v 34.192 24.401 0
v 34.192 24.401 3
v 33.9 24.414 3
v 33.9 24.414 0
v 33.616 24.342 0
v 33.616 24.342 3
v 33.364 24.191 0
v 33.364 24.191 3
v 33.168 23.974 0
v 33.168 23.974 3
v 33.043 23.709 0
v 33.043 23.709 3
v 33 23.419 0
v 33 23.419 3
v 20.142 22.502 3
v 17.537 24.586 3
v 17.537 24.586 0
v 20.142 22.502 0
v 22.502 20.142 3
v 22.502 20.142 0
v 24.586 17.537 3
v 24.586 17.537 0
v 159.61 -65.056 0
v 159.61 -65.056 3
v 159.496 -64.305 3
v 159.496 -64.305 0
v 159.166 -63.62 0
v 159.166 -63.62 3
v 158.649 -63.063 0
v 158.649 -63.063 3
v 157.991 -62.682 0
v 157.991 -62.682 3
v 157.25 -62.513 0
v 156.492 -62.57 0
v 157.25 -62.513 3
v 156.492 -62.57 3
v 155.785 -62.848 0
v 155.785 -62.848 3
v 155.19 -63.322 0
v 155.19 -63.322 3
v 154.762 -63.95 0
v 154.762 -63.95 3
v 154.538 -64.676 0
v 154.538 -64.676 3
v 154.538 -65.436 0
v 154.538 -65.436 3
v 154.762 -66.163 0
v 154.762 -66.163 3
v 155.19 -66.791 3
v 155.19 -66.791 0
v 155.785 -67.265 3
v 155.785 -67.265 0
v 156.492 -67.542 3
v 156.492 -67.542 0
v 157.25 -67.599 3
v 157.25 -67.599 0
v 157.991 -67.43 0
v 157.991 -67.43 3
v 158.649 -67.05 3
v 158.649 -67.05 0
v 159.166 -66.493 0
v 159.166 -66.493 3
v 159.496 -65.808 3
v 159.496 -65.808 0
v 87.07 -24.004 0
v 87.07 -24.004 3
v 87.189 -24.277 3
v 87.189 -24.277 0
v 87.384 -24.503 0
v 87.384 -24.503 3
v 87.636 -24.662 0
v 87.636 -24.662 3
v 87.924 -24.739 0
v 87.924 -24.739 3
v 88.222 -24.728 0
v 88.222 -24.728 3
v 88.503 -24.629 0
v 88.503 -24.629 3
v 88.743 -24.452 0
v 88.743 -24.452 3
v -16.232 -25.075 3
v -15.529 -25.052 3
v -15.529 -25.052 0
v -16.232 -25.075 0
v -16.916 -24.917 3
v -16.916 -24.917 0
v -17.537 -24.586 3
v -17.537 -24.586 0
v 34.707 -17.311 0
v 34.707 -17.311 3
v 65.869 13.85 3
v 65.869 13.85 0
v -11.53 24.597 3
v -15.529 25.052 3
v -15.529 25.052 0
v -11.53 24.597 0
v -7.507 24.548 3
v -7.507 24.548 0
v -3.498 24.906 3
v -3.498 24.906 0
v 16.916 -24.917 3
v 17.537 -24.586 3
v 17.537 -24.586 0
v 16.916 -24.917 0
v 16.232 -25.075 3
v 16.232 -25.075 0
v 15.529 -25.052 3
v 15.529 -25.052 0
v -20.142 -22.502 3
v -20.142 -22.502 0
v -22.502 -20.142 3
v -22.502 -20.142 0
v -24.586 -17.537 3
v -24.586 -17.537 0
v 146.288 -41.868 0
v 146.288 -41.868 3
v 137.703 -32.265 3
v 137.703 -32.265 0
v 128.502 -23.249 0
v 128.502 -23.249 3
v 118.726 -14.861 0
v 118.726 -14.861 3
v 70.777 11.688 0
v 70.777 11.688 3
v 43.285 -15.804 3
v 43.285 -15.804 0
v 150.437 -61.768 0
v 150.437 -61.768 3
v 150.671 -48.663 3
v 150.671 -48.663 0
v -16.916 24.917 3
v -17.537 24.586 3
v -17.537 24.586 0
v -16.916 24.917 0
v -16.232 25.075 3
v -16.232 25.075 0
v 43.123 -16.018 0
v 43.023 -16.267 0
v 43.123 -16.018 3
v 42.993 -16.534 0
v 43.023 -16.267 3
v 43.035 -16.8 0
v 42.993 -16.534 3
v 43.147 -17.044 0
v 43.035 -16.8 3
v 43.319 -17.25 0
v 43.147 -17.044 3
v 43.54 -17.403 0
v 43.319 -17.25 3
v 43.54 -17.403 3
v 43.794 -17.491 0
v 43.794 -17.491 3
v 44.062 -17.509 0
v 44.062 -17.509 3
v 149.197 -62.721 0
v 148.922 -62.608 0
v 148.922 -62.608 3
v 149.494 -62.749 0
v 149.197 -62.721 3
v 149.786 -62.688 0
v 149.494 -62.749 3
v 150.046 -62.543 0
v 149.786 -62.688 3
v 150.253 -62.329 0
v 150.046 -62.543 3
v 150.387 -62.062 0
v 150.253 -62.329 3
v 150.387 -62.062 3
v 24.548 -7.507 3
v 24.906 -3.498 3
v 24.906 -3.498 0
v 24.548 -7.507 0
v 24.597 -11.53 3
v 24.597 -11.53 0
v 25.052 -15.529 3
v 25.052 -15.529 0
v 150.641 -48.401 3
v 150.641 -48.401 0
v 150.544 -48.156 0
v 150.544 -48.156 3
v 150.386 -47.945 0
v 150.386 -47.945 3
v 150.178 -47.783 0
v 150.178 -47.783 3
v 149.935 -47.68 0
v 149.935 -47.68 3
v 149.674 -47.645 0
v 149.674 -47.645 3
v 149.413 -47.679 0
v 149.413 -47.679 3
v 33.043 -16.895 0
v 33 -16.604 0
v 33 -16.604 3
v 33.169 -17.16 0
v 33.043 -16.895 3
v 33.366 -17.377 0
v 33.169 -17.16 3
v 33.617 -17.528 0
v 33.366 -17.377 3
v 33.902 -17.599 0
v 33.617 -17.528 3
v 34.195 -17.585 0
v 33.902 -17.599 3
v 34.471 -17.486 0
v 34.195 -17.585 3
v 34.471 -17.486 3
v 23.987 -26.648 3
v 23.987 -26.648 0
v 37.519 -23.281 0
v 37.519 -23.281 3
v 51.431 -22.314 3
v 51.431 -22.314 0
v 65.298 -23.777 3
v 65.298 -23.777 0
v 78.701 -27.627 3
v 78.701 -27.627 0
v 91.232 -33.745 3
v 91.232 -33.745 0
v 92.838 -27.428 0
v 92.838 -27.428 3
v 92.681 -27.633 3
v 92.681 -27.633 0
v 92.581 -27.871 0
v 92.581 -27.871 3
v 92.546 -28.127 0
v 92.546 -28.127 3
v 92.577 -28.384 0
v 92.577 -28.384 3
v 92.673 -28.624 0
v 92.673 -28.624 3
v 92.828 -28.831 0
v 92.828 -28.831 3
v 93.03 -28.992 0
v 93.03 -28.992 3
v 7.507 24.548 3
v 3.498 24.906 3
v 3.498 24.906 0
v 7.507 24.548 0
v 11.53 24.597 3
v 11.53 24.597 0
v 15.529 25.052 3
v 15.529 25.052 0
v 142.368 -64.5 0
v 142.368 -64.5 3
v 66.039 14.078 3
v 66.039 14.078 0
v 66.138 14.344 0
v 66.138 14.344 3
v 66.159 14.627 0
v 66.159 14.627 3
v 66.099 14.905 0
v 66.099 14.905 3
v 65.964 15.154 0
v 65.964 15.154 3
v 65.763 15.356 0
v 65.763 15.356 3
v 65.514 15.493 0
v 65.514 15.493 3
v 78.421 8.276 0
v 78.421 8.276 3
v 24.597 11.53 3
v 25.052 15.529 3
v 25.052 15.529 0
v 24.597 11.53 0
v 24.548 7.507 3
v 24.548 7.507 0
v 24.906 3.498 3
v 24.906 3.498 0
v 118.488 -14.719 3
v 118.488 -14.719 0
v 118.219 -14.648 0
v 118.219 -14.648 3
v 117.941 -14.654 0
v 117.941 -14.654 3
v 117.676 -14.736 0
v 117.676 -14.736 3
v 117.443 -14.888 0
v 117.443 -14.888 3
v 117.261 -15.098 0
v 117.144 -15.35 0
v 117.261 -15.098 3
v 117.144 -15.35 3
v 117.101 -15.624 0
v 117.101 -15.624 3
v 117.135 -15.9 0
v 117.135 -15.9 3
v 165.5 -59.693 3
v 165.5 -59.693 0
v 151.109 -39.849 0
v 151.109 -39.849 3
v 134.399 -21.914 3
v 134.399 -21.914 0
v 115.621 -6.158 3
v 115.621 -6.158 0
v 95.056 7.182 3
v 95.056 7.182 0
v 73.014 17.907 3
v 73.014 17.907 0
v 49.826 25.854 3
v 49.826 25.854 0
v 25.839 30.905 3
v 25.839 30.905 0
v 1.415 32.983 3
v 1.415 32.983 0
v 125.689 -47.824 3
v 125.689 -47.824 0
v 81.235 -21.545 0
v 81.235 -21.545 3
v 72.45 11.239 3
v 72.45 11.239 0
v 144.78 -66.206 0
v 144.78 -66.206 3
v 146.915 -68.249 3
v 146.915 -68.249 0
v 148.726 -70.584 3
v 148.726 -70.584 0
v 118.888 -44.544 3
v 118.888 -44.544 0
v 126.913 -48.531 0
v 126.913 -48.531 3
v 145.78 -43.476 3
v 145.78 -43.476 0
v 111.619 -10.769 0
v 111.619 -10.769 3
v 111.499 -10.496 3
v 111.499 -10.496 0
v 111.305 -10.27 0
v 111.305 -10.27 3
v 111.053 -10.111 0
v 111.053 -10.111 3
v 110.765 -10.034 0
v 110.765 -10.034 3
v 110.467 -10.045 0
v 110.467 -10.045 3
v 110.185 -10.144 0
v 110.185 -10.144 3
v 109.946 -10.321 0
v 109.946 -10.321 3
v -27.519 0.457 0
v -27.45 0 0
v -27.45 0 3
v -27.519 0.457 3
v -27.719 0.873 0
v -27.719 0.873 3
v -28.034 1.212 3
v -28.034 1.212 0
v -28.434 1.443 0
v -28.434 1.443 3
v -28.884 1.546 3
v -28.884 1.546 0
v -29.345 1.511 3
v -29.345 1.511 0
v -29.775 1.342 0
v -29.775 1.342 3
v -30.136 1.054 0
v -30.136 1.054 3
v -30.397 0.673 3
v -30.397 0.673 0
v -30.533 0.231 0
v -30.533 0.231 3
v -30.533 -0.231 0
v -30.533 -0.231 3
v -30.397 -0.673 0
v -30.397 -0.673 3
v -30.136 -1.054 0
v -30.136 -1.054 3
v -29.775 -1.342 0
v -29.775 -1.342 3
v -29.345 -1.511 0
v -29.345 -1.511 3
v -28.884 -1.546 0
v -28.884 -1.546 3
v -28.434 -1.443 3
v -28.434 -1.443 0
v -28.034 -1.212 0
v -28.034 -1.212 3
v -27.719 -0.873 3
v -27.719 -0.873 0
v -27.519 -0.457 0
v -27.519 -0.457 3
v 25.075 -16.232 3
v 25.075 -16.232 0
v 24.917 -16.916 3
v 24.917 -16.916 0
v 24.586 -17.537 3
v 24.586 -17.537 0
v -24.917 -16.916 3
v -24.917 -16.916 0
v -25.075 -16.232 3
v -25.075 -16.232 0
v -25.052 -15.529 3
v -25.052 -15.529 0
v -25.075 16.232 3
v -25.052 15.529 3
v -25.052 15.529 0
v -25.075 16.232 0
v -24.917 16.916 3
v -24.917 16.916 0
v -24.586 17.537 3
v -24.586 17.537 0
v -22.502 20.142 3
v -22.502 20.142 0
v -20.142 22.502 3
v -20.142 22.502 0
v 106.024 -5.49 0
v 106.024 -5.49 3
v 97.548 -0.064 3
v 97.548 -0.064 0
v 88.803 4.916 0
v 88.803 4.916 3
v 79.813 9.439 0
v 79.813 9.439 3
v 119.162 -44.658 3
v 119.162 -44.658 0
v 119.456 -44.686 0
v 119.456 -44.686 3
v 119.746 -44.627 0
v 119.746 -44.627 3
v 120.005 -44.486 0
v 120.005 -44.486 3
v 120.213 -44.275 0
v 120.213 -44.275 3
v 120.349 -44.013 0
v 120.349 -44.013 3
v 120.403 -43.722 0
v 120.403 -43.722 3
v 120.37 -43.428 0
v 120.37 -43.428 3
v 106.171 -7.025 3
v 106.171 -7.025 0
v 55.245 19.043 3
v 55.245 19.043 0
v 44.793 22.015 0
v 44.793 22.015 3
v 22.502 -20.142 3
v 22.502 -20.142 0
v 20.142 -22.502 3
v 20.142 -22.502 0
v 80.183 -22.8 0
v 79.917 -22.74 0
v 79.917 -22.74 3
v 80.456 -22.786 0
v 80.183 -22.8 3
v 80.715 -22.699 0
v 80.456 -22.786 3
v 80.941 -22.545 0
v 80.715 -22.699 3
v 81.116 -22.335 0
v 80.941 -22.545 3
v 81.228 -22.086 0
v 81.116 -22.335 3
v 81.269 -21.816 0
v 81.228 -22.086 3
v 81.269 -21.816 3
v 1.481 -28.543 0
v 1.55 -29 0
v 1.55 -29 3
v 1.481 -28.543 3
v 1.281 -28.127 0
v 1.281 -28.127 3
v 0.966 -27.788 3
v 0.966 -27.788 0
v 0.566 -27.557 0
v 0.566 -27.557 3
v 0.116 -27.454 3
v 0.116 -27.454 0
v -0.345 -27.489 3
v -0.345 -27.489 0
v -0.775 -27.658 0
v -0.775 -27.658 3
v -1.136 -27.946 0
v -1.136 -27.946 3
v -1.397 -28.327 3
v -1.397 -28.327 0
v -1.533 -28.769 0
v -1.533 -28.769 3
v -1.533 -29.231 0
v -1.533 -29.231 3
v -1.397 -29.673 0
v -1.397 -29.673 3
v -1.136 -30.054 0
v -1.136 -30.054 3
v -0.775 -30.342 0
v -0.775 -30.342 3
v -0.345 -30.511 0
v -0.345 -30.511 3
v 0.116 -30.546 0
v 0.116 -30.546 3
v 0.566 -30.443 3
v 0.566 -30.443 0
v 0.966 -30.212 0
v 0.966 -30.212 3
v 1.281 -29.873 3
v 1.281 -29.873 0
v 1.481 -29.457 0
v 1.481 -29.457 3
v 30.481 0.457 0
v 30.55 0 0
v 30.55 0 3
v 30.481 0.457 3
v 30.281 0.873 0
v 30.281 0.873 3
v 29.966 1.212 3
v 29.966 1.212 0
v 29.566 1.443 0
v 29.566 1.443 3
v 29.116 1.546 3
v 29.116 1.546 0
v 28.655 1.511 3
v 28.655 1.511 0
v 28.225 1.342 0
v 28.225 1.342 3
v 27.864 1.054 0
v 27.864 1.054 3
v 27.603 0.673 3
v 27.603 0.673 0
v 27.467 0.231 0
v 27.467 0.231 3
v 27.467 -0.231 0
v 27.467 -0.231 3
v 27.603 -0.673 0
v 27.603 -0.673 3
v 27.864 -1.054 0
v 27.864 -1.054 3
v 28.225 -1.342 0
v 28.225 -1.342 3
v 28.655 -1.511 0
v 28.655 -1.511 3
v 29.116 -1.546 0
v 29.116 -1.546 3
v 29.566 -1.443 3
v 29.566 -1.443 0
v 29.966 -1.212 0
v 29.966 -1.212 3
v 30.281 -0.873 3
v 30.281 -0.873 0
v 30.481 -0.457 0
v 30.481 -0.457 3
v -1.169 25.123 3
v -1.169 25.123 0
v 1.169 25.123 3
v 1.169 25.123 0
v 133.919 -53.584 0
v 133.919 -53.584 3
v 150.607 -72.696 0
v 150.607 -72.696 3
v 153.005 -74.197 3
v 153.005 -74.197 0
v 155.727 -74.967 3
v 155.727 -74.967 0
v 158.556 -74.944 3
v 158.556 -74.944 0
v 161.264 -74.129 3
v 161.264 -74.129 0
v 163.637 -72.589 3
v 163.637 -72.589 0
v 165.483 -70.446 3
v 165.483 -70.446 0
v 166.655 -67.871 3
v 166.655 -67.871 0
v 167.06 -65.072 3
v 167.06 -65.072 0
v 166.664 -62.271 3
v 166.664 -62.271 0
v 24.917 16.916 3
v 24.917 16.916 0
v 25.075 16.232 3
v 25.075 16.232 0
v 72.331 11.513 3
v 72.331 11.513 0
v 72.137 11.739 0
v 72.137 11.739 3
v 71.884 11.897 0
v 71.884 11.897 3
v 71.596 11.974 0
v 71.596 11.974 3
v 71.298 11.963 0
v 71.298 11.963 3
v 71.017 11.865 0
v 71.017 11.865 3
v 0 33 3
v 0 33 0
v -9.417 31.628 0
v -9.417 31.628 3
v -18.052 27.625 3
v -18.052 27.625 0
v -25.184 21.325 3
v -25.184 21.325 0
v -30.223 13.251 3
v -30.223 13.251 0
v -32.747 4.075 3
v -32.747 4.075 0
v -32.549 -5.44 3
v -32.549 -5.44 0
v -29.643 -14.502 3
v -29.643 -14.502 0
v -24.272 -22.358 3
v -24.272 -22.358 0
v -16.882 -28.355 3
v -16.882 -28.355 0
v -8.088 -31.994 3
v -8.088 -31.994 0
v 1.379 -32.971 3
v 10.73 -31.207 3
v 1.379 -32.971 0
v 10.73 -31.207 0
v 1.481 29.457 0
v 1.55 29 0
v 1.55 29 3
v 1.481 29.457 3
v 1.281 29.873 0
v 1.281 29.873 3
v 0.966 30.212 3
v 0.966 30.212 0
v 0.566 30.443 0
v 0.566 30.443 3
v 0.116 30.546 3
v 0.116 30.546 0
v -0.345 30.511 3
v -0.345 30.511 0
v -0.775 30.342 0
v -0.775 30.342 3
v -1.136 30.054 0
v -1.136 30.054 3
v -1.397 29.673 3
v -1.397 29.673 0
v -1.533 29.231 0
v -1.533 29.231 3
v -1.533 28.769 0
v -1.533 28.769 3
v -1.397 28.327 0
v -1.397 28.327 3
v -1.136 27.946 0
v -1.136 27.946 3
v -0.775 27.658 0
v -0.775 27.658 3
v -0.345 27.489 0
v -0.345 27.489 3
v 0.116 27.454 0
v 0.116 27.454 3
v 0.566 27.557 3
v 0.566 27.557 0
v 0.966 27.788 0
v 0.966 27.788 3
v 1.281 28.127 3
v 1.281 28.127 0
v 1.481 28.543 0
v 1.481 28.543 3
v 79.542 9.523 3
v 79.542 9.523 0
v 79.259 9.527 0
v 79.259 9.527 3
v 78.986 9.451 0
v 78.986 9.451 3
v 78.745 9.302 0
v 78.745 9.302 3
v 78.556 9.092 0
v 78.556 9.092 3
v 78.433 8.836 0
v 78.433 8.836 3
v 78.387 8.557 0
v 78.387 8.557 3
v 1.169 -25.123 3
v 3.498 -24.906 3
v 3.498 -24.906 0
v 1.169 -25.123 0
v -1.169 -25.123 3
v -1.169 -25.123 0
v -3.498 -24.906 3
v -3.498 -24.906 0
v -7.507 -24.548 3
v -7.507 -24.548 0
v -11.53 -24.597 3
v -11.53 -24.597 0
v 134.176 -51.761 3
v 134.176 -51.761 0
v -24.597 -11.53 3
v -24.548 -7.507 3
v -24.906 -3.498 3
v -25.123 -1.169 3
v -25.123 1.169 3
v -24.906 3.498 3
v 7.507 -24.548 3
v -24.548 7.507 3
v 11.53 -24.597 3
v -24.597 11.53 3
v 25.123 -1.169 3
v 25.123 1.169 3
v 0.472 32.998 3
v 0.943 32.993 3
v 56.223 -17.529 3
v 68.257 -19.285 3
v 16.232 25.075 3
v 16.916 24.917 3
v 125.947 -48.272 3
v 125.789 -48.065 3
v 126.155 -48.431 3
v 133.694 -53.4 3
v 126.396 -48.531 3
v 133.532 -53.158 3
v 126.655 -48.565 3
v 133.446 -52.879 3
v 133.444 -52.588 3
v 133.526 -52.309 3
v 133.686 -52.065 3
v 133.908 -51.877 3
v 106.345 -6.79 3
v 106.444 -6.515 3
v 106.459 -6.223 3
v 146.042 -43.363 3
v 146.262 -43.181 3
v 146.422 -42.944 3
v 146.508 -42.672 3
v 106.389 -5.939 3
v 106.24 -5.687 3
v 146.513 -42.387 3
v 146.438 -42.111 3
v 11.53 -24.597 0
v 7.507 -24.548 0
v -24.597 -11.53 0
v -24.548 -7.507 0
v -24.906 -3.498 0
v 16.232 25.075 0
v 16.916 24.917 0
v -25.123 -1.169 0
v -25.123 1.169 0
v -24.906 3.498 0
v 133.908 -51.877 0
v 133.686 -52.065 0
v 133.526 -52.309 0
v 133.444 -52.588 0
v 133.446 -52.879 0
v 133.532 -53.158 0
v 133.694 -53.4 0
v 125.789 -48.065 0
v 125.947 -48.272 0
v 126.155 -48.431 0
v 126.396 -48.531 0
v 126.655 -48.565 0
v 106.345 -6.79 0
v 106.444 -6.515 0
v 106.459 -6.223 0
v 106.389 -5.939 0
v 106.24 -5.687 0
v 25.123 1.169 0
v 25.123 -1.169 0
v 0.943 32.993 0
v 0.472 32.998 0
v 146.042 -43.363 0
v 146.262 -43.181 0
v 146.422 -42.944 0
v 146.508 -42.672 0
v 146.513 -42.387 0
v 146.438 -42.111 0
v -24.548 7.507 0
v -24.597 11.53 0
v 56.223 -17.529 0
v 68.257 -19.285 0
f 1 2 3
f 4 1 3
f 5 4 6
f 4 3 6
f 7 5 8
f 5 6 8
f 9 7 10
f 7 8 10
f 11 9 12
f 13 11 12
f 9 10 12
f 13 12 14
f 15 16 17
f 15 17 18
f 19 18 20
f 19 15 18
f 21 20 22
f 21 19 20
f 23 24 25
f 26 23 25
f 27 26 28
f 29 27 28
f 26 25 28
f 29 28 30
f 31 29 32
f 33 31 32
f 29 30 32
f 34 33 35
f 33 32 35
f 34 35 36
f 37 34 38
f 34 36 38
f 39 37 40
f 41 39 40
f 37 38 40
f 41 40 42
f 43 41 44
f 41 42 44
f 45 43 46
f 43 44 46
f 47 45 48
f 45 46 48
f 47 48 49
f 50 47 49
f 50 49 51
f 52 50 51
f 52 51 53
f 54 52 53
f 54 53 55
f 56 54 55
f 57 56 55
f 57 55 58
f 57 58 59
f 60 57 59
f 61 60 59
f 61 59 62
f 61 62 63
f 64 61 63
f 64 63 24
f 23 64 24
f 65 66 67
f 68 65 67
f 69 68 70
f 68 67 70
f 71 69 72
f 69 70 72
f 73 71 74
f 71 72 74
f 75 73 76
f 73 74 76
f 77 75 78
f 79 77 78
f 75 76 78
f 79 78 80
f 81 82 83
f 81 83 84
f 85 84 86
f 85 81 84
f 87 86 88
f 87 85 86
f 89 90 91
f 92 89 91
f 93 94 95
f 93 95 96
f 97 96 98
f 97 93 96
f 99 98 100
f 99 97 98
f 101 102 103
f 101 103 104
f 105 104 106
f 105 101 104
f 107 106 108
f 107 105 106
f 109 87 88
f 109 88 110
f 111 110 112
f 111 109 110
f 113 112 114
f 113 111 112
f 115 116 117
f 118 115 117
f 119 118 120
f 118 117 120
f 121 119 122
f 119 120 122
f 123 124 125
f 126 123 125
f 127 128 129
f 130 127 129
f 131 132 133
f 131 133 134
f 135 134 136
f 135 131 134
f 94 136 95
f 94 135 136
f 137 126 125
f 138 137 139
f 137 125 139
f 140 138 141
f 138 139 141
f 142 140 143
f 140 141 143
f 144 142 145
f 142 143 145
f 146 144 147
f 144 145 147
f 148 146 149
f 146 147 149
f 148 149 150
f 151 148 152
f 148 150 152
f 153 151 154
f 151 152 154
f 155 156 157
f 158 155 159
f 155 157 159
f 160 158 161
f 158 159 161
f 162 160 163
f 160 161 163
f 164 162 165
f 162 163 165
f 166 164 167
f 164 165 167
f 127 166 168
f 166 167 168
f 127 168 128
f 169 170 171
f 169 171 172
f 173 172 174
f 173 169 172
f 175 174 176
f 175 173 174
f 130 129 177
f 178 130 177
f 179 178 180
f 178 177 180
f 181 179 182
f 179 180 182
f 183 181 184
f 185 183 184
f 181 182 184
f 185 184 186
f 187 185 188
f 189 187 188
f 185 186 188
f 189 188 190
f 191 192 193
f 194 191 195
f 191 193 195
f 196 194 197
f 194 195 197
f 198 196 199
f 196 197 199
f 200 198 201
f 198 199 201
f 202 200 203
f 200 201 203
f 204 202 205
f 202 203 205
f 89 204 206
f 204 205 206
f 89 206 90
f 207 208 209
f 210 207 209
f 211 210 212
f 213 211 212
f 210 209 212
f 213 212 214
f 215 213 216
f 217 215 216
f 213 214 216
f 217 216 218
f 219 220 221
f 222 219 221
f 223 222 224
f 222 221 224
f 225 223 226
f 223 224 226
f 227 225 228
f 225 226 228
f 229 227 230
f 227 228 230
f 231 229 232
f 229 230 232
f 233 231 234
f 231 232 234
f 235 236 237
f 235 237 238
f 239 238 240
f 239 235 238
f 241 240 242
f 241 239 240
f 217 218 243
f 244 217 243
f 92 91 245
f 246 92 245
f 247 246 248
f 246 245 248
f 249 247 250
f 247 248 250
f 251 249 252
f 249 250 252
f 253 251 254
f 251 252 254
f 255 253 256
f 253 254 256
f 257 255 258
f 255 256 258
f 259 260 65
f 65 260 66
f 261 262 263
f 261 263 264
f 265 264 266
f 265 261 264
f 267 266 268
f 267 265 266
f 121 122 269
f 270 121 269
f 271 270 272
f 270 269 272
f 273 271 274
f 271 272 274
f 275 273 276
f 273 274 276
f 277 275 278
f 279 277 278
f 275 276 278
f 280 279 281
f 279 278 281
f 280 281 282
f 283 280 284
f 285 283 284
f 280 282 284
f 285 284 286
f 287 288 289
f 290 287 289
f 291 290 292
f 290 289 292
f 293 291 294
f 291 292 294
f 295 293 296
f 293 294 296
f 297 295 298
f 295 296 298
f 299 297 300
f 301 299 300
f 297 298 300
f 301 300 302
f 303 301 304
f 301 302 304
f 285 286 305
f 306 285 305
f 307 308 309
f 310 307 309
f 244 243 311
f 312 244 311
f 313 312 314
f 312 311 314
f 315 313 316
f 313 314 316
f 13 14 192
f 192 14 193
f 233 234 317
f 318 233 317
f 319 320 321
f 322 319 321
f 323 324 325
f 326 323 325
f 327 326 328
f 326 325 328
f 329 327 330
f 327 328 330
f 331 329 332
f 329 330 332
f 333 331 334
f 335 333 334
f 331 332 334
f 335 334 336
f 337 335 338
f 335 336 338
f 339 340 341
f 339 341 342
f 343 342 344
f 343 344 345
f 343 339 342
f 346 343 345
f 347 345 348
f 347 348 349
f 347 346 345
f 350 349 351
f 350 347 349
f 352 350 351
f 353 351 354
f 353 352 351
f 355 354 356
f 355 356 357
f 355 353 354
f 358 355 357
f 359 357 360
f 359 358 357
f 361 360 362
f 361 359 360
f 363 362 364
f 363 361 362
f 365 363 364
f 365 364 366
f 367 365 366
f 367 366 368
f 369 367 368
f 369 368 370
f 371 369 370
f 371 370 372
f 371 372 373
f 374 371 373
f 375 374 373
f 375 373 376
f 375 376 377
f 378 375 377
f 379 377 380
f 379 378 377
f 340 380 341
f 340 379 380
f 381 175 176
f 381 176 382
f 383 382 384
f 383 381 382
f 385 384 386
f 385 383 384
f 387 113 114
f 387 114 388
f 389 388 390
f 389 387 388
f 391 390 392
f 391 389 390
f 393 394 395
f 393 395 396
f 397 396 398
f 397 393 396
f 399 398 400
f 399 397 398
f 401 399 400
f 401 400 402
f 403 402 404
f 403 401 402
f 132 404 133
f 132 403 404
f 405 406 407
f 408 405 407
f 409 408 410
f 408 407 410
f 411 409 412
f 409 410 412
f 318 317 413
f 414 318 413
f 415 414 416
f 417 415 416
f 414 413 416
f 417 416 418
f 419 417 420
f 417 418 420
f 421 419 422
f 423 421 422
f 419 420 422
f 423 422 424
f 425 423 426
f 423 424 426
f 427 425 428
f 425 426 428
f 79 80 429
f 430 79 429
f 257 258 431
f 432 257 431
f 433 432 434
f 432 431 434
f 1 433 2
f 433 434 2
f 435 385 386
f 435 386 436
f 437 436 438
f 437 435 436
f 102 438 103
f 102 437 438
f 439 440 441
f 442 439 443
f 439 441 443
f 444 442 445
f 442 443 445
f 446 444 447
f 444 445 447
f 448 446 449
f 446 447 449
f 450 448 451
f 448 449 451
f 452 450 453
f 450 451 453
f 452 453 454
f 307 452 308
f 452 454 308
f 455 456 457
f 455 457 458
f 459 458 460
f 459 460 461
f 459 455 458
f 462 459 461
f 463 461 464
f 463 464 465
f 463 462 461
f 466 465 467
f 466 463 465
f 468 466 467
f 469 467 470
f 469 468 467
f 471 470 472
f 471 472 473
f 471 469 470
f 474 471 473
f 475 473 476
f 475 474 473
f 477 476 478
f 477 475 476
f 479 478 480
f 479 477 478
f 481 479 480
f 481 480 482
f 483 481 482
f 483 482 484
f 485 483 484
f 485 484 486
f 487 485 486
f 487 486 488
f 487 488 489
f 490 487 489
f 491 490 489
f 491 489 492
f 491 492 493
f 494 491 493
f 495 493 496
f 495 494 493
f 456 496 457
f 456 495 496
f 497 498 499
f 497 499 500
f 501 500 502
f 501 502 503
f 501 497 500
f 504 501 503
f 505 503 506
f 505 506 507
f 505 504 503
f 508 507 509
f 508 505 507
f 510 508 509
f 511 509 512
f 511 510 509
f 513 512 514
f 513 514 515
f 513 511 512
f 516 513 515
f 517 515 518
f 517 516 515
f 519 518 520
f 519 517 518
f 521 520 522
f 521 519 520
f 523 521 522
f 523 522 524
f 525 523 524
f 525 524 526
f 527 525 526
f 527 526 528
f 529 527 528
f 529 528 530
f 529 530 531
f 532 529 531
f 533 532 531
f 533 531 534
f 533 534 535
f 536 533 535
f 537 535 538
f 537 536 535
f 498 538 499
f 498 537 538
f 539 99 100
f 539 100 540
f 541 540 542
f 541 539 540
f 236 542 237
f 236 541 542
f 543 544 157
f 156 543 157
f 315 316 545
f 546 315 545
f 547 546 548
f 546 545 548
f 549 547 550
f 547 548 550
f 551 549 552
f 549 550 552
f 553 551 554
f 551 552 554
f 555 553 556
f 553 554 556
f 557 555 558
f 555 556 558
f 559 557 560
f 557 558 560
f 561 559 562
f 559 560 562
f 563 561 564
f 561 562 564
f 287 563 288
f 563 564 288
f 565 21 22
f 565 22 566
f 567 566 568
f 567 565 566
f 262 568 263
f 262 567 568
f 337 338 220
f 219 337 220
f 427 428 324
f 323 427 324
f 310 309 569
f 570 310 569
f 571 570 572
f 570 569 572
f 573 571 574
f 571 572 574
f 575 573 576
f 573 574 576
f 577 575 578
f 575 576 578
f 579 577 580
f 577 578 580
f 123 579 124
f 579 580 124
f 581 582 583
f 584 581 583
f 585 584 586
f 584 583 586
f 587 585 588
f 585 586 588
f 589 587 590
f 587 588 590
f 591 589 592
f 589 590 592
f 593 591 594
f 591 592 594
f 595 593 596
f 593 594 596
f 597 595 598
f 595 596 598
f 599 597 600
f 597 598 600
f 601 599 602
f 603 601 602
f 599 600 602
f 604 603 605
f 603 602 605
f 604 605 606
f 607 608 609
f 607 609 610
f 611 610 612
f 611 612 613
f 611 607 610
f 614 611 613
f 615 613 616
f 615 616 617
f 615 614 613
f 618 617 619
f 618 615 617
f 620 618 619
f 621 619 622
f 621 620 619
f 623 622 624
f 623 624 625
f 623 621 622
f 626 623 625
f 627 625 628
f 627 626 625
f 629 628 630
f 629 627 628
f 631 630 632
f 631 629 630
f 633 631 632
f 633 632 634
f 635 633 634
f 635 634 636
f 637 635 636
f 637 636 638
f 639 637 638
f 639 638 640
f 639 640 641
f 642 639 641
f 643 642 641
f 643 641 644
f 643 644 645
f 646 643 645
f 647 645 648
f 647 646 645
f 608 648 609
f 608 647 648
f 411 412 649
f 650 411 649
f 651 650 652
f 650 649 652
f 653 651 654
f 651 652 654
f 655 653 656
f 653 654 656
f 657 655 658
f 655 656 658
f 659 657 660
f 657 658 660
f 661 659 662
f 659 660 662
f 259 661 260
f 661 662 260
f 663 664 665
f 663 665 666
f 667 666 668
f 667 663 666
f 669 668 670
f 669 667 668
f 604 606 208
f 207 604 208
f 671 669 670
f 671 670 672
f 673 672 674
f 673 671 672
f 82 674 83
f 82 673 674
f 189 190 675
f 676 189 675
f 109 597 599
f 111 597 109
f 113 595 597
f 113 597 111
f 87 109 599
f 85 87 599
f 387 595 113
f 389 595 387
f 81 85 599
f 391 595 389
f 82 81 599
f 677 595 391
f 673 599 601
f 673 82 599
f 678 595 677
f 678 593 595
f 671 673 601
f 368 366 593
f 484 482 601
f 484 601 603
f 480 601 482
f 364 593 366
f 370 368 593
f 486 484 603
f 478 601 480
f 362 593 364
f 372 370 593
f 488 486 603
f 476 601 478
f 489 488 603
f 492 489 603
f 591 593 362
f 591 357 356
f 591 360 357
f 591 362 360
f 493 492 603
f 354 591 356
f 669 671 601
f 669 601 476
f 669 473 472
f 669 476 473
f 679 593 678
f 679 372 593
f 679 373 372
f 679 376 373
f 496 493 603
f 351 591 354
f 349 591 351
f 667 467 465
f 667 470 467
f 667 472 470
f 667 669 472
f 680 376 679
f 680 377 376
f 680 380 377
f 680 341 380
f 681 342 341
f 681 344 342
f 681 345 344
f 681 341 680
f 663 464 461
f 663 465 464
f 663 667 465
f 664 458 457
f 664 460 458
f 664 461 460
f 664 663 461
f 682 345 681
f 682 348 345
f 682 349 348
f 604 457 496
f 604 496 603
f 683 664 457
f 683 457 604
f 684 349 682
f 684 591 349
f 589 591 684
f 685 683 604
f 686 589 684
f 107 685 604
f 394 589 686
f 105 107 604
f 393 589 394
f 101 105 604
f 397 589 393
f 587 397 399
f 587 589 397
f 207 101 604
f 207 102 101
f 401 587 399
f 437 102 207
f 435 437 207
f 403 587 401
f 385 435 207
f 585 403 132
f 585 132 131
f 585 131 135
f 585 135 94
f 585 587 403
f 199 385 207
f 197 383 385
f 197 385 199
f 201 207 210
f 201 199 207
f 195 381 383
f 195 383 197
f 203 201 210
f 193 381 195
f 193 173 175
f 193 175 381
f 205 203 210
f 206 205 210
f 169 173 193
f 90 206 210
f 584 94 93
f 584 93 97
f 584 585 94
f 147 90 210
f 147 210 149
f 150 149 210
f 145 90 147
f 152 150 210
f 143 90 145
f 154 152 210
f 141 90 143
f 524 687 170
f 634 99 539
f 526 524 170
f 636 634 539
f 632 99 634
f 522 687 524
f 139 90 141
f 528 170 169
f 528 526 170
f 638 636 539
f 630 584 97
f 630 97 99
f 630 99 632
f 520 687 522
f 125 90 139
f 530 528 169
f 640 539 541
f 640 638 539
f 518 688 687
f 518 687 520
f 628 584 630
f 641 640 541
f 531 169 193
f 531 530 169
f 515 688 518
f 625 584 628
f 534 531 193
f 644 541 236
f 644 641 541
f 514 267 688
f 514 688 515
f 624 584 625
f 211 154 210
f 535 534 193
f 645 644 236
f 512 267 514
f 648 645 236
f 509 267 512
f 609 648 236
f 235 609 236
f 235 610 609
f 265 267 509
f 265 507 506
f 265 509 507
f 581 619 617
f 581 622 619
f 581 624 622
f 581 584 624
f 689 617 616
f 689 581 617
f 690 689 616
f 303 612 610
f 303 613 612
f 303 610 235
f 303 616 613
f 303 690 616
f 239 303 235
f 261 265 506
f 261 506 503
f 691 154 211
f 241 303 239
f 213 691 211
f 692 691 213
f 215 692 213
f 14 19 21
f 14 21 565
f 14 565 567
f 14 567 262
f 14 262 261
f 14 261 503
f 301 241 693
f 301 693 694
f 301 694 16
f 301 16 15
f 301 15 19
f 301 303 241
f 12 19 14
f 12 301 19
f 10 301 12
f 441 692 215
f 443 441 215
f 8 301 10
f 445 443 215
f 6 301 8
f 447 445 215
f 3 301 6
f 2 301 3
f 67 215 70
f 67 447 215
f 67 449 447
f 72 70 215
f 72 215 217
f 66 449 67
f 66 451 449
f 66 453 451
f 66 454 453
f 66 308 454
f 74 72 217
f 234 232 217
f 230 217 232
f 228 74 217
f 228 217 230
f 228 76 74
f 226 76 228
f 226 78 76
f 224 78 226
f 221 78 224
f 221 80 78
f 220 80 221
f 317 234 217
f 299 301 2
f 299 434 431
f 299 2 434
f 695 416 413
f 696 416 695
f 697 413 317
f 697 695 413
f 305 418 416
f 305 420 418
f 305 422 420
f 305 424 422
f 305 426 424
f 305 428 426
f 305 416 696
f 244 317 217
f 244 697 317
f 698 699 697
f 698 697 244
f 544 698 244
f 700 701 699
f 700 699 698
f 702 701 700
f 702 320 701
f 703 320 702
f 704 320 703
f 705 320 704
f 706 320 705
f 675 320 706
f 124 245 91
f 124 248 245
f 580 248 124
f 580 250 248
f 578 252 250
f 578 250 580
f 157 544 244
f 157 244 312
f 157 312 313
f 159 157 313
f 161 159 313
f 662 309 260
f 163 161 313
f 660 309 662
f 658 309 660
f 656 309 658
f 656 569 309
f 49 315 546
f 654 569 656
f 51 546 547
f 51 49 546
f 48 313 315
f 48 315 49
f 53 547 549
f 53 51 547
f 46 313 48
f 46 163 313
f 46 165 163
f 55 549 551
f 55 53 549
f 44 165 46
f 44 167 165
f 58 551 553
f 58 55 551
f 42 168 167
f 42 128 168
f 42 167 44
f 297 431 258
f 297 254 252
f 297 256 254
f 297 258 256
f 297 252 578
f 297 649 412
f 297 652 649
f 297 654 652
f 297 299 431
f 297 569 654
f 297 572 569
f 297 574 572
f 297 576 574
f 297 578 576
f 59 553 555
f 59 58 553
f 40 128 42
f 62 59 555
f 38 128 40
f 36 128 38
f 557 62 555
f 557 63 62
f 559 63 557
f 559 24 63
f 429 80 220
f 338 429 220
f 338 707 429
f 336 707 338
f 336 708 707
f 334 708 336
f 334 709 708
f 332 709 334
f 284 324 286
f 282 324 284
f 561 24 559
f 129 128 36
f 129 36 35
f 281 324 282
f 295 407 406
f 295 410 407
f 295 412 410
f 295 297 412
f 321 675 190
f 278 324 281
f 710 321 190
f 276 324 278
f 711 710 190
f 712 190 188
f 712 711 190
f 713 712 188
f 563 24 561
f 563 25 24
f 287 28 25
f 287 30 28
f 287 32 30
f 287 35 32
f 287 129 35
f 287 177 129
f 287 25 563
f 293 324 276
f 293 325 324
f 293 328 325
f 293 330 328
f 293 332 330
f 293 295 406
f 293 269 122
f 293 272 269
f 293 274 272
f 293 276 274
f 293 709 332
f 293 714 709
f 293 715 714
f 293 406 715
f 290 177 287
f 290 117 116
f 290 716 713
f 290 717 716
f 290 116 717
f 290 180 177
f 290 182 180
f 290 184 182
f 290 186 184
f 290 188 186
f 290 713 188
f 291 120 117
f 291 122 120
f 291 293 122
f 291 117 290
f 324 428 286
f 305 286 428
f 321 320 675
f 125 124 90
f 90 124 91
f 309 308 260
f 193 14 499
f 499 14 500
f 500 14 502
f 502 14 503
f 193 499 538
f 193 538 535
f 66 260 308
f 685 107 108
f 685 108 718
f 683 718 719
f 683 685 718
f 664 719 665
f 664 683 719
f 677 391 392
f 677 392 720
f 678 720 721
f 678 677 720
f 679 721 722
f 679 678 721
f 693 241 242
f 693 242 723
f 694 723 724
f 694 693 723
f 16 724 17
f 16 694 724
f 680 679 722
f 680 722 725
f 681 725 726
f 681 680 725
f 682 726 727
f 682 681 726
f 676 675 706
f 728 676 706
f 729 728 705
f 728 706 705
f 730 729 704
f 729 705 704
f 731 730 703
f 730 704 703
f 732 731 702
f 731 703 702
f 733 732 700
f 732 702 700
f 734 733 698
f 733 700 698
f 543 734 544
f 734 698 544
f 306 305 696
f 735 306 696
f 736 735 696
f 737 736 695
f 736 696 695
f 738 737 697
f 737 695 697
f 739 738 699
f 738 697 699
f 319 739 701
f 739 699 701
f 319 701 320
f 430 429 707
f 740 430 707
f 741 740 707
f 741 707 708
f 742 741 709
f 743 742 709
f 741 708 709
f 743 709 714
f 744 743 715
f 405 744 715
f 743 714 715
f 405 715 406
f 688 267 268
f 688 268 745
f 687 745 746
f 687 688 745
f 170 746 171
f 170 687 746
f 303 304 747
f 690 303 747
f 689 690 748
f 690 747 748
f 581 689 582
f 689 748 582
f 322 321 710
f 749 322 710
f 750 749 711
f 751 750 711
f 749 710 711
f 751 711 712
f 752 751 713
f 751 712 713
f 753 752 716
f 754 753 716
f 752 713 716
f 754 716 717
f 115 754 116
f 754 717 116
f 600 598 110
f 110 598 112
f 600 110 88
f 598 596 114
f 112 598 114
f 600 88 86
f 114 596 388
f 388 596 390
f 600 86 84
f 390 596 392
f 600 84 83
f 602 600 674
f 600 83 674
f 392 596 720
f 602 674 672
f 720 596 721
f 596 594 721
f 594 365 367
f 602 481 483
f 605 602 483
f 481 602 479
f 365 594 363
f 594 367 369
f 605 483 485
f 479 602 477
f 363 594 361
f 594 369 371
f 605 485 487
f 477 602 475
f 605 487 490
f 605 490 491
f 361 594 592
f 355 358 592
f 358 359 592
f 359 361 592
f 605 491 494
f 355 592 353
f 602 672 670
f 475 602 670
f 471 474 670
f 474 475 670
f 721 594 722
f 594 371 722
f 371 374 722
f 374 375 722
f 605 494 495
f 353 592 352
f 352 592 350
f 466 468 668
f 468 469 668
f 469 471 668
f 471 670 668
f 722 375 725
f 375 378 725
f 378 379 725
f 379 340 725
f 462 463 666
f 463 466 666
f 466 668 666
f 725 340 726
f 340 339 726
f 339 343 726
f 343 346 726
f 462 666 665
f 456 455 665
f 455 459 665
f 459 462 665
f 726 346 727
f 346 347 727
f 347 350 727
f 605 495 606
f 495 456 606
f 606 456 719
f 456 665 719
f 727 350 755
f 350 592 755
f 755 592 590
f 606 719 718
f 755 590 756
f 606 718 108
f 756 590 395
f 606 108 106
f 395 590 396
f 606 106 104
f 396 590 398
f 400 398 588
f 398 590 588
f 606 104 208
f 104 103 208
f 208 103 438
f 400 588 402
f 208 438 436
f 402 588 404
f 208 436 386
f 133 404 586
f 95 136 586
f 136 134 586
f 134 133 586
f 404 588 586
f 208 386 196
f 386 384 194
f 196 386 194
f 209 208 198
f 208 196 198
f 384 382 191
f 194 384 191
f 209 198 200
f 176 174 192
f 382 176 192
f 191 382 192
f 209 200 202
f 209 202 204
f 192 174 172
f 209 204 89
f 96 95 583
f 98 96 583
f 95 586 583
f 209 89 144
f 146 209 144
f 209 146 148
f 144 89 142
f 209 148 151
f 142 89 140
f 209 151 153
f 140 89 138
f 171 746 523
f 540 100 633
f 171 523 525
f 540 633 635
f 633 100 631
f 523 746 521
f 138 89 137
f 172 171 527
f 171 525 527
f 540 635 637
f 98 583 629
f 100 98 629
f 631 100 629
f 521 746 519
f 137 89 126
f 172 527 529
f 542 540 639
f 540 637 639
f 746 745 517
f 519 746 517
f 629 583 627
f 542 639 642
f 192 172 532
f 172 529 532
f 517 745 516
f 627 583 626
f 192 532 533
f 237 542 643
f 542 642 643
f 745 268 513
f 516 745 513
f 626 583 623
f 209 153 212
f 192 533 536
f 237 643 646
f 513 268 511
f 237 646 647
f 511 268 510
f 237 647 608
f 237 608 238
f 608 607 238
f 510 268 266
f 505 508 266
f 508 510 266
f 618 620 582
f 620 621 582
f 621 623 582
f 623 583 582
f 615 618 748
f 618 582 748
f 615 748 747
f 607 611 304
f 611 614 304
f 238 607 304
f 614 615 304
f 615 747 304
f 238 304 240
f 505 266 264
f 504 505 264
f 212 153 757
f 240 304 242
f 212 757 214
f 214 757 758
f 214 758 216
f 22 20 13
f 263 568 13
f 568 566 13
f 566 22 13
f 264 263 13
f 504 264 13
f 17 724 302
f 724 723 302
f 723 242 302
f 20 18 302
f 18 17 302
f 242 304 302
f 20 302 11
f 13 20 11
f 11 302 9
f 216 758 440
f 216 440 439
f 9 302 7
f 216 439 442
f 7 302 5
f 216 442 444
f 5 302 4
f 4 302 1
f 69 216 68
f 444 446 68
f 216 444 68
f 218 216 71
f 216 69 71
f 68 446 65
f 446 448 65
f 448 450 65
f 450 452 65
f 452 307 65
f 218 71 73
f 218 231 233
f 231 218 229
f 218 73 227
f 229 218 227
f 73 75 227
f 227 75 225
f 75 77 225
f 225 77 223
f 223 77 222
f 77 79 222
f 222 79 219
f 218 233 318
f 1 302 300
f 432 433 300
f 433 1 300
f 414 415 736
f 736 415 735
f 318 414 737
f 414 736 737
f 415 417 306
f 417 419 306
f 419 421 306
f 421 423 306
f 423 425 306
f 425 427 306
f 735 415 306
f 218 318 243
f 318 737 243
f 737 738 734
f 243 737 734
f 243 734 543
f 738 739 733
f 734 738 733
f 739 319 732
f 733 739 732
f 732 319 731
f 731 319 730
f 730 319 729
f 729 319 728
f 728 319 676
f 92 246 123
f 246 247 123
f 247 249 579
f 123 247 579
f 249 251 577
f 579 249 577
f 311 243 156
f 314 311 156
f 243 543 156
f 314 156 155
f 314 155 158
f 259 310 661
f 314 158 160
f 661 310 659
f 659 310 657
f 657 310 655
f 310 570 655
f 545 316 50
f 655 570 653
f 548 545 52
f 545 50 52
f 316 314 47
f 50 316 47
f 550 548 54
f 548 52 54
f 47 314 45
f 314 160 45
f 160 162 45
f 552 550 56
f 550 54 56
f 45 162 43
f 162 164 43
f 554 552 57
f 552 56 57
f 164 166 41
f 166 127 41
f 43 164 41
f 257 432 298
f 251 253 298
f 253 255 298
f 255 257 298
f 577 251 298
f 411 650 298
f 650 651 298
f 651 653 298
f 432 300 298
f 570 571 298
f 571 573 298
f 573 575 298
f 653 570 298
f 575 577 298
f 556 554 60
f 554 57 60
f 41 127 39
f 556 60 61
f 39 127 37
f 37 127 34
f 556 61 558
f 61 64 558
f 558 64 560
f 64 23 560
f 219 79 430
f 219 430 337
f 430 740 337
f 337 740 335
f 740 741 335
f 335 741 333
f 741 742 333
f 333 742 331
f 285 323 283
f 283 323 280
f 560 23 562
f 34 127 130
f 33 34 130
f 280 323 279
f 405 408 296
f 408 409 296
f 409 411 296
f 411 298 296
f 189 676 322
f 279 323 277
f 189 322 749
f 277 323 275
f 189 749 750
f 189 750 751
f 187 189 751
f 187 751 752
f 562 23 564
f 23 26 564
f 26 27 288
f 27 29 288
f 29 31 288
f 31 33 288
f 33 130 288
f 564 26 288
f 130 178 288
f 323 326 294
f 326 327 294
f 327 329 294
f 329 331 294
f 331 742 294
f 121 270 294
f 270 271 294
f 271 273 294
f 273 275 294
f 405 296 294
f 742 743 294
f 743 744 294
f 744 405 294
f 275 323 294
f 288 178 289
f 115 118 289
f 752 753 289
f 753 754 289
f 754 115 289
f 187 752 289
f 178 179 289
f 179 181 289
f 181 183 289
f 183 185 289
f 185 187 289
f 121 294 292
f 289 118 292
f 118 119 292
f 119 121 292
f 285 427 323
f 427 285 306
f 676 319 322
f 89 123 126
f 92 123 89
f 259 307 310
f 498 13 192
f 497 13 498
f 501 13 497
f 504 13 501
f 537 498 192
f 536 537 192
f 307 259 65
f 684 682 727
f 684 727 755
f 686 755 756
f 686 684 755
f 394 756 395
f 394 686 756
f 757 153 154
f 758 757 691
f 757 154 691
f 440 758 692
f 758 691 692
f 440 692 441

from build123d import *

# Parameters (mm, degrees)
SKETCH_2_R          = 1.55
EXTRUDE_1_DEPTH     = 3
SKETCH_7_R          = 2.55
CUT_EXTRUDE_2_DEPTH = 5
CUT_EXTRUDE_4_DEPTH = 184.170177924
CUT_EXTRUDE_5_DEPTH = 184.170177924


with BuildPart() as part:
    # 草图2 → 凸台-拉伸1 (new body)
    with BuildSketch(Plane.XY):
        with BuildLine():
            Line((10.730362356, -31.206719208), (23.987000349, -26.648453139))
            ThreePointArc((23.987000349, -26.648453139), (58.3964084, -22.742948884), (91.232460283, -33.745404185))
            Line((91.232460283, -33.745404185), (142.367635598, -64.500382059))
            ThreePointArc((142.367635598, -64.500382059), (145.885654628, -67.188078585), (148.726187194, -70.583891486))
            ThreePointArc((148.726187194, -70.583891486), (162.505343691, -73.443257489), (165.49953058, -59.692767585))
            ThreePointArc((165.49953058, -59.692767585), (95.05641772, 7.182197604), (1.414573065, 32.983322541))
            ThreePointArc((1.414573065, 32.983322541), (0.707335687, 32.99583049), (0, 33))
            ThreePointArc((0, 33), (-32.548592395, -5.439589421), (10.730362356, -31.206719208))
        make_face()
        with Locations((-29, 0)):
            Circle(SKETCH_2_R, mode=Mode.SUBTRACT)
        with Locations((0, 29)):
            Circle(SKETCH_2_R, mode=Mode.SUBTRACT)
        with Locations((0, -29)):
            Circle(SKETCH_2_R, mode=Mode.SUBTRACT)
        with Locations((29, 0)):
            Circle(SKETCH_2_R, mode=Mode.SUBTRACT)
        with BuildLine():
            ThreePointArc((-17.479158967, 24.504877103), (-21.283914114, 21.283914114), (-24.504877103, 17.479158967))
            ThreePointArc((-24.504877103, 17.479158967), (-24.920981627, 16.556612715), (-24.953330783, 15.545085111))
            ThreePointArc((-24.953330783, 15.545085111), (-24.421536801, 9.520350069), (-24.806472783, 3.484452336))
            ThreePointArc((-24.806472783, 3.484452336), (-25.05, 0), (-24.806472783, -3.484452336))
            ThreePointArc((-24.806472783, -3.484452336), (-24.421536801, -9.520350069), (-24.953330783, -15.545085111))
            ThreePointArc((-24.953330783, -15.545085111), (-24.920981627, -16.556612715), (-24.504877103, -17.479158967))
            ThreePointArc((-24.504877103, -17.479158967), (-21.283914114, -21.283914114), (-17.479158967, -24.504877103))
            ThreePointArc((-17.479158967, -24.504877103), (-16.556612715, -24.920981627), (-15.545085111, -24.953330783))
            ThreePointArc((-15.545085111, -24.953330783), (-9.520350069, -24.421536801), (-3.484452336, -24.806472783))
            ThreePointArc((-3.484452336, -24.806472783), (0, -25.05), (3.484452336, -24.806472783))
            ThreePointArc((3.484452336, -24.806472783), (9.520350069, -24.421536801), (15.545085111, -24.953330783))
            ThreePointArc((15.545085111, -24.953330783), (16.556612715, -24.920981627), (17.479158967, -24.504877103))
            ThreePointArc((17.479158967, -24.504877103), (21.283914114, -21.283914114), (24.504877103, -17.479158967))
            ThreePointArc((24.504877103, -17.479158967), (24.920981627, -16.556612715), (24.953330783, -15.545085111))
            ThreePointArc((24.953330783, -15.545085111), (24.421536801, -9.520350069), (24.806472783, -3.484452336))
            ThreePointArc((24.806472783, -3.484452336), (25.05, 0), (24.806472783, 3.484452336))
            ThreePointArc((24.806472783, 3.484452336), (24.421536801, 9.520350069), (24.953330783, 15.545085111))
            ThreePointArc((24.953330783, 15.545085111), (24.920981627, 16.556612715), (24.504877103, 17.479158967))
            ThreePointArc((24.504877103, 17.479158967), (21.283914114, 21.283914114), (17.479158967, 24.504877103))
            ThreePointArc((17.479158967, 24.504877103), (16.556612715, 24.920981627), (15.545085111, 24.953330783))
            ThreePointArc((15.545085111, 24.953330783), (9.520350069, 24.421536801), (3.484452336, 24.806472783))
            ThreePointArc((3.484452336, 24.806472783), (0, 25.05), (-3.484452336, 24.806472783))
            ThreePointArc((-3.484452336, 24.806472783), (-9.520350069, 24.421536801), (-15.545085111, 24.953330783))
            ThreePointArc((-15.545085111, 24.953330783), (-16.556612715, 24.920981627), (-17.479158967, 24.504877103))
        make_face(mode=Mode.SUBTRACT)
    extrude(amount=EXTRUDE_1_DEPTH)

    # 草图7 → 切除-拉伸2 (cut)
    with BuildSketch(Plane.XY.offset(3)):
        with Locations((157.059520527, -65.056183502)):
            Circle(SKETCH_7_R)
    extrude(amount=-CUT_EXTRUDE_2_DEPTH, mode=Mode.SUBTRACT)

    # 草图9 → 切除-拉伸4 (cut, through all)
    with BuildSketch(Plane.XY.offset(3)):
        with BuildLine():
            Line((33, 23.419217625), (33, -16.604240946))
            ThreePointArc((33, -16.604240946), (33.617316568, -17.528120479), (34.707106781, -17.311347728))
            Line((34.707106781, -17.311347728), (65.868650079, 13.85019557))
            ThreePointArc((65.868650079, 13.85019557), (66.139078304, 14.768075481), (65.514441307, 15.492964147))
            ThreePointArc((65.514441307, 15.492964147), (50.039622799, 20.601738513), (34.192271497, 24.400559396))
            ThreePointArc((34.192271497, 24.400559396), (33.364496852, 24.191315902), (33, 23.419217625))
        make_face()
        with BuildLine():
            Line((70.777272632, 11.687750311), (43.285444418, -15.804077902))
            ThreePointArc((43.285444418, -15.804077902), (43.082610213, -16.925922432), (44.062405255, -17.508741905))
            ThreePointArc((44.062405255, -17.508741905), (62.271705947, -18.191622153), (79.917026283, -22.739987506))
            ThreePointArc((79.917026283, -22.739987506), (80.940663068, -22.54482321), (81.234917124, -21.545155305))
            Line((81.234917124, -21.545155305), (72.450305239, 11.239462575))
            ThreePointArc((72.450305239, 11.239462575), (71.743198458, 11.946569356), (70.777272632, 11.687750311))
        make_face()
        with BuildLine():
            Line((78.420751264, 8.275971191), (87.070117002, -24.003901194))
            ThreePointArc((87.070117002, -24.003901194), (87.777223783, -24.711007975), (88.743149609, -24.45218893))
            Line((88.743149609, -24.45218893), (106.170669274, -7.024669265))
            ThreePointArc((106.170669274, -7.024669265), (106.459042033, -6.222586245), (106.024202869, -5.489503085))
            ThreePointArc((106.024202869, -5.489503085), (93.207654626, 2.482542409), (79.812900532, 9.439408155))
            ThreePointArc((79.812900532, 9.439408155), (78.745415788, 9.302112816), (78.420751264, 8.275971191))
        make_face()
        with BuildLine():
            Line((109.945638003, -10.320768348), (92.838490747, -27.427915604))
            ThreePointArc((92.838490747, -27.427915604), (92.553025259, -28.256678823), (93.030191775, -28.991968654))
            Line((93.030191775, -28.991968654), (118.888407737, -44.544254432))
            ThreePointArc((118.888407737, -44.544254432), (120.005457191, -44.486072744), (120.369739316, -43.428489117))
            Line((120.369739316, -43.428489117), (111.61867061, -10.769056085))
            ThreePointArc((111.61867061, -10.769056085), (110.911563829, -10.061949303), (109.945638003, -10.320768348))
        make_face()
        with BuildLine():
            Line((117.134569213, -15.899856701), (125.688599687, -47.823933039))
            ThreePointArc((125.688599687, -47.823933039), (126.154525513, -48.431139397), (126.913344559, -48.53103982))
            Line((126.913344559, -48.53103982), (145.779824835, -43.475781666))
            ThreePointArc((145.779824835, -43.475781666), (146.474470094, -42.811361762), (146.288127832, -41.868354653))
            ThreePointArc((146.288127832, -41.868354653), (133.176898235, -27.681248062), (118.726274243, -14.861037407))
            ThreePointArc((118.726274243, -14.861037407), (117.553950154, -14.803607846), (117.134569213, -15.899856701))
        make_face()
        with BuildLine():
            Line((149.412514403, -47.678786332), (134.175652373, -51.761491208))
            ThreePointArc((134.175652373, -51.761491208), (133.444233225, -52.588031523), (133.919065665, -53.584363304))
            Line((133.919065665, -53.584363304), (148.921539819, -62.607521196))
            ThreePointArc((148.921539819, -62.607521196), (149.921379935, -62.625402537), (150.436785689, -61.768456267))
            Line((150.436785689, -61.768456267), (150.671173564, -48.662593499))
            ThreePointArc((150.671173564, -48.662593499), (150.287163938, -47.856833482), (149.412514403, -47.678786332))
        make_face()
    extrude(amount=-CUT_EXTRUDE_4_DEPTH, mode=Mode.SUBTRACT)

    # 草图10 → 切除-拉伸5 (cut, through all)
    with BuildSketch(Plane.XY.offset(3)):
        with BuildLine():
            ThreePointArc((-3.498362326, -24.905500618), (-9.519132496, -24.521529388), (-15.52876795, -25.051990553))
            ThreePointArc((-15.52876795, -25.051990553), (-16.579200462, -25.018397199), (-17.537229262, -24.586288654))
            ThreePointArc((-17.537229262, -24.586288654), (-21.354624792, -21.354624792), (-24.586288654, -17.537229262))
            ThreePointArc((-24.586288654, -17.537229262), (-25.018397199, -16.579200462), (-25.051990553, -15.52876795))
            ThreePointArc((-25.051990553, -15.52876795), (-24.521529388, -9.519132496), (-24.905500618, -3.498362326))
            ThreePointArc((-24.905500618, -3.498362326), (-25.15, 0), (-24.905500618, 3.498362326))
            ThreePointArc((-24.905500618, 3.498362326), (-24.521529388, 9.519132496), (-25.051990553, 15.52876795))
            ThreePointArc((-25.051990553, 15.52876795), (-25.018397199, 16.579200462), (-24.586288654, 17.537229262))
            ThreePointArc((-24.586288654, 17.537229262), (-21.354624792, 21.354624792), (-17.537229262, 24.586288654))
            ThreePointArc((-17.537229262, 24.586288654), (-16.579200462, 25.018397199), (-15.52876795, 25.051990553))
            ThreePointArc((-15.52876795, 25.051990553), (-9.519132496, 24.521529388), (-3.498362326, 24.905500618))
            ThreePointArc((-3.498362326, 24.905500618), (0, 25.15), (3.498362326, 24.905500618))
            ThreePointArc((3.498362326, 24.905500618), (9.519132496, 24.521529388), (15.52876795, 25.051990553))
            ThreePointArc((15.52876795, 25.051990553), (16.579200462, 25.018397199), (17.537229262, 24.586288654))
            ThreePointArc((17.537229262, 24.586288654), (21.354624792, 21.354624792), (24.586288654, 17.537229262))
            ThreePointArc((24.586288654, 17.537229262), (25.018397199, 16.579200462), (25.051990553, 15.52876795))
            ThreePointArc((25.051990553, 15.52876795), (24.521529388, 9.519132496), (24.905500618, 3.498362326))
            ThreePointArc((24.905500618, 3.498362326), (25.15, 0), (24.905500618, -3.498362326))
            ThreePointArc((24.905500618, -3.498362326), (24.521529388, -9.519132496), (25.051990553, -15.52876795))
            ThreePointArc((25.051990553, -15.52876795), (25.018397199, -16.579200462), (24.586288654, -17.537229262))
            ThreePointArc((24.586288654, -17.537229262), (21.354624792, -21.354624792), (17.537229262, -24.586288654))
            ThreePointArc((17.537229262, -24.586288654), (16.579200462, -25.018397199), (15.52876795, -25.051990553))
            ThreePointArc((15.52876795, -25.051990553), (9.519132496, -24.521529388), (3.498362326, -24.905500618))
            ThreePointArc((3.498362326, -24.905500618), (0, -25.15), (-3.498362326, -24.905500618))
        make_face()
    extrude(amount=-CUT_EXTRUDE_5_DEPTH, mode=Mode.SUBTRACT)


solid = part.part
